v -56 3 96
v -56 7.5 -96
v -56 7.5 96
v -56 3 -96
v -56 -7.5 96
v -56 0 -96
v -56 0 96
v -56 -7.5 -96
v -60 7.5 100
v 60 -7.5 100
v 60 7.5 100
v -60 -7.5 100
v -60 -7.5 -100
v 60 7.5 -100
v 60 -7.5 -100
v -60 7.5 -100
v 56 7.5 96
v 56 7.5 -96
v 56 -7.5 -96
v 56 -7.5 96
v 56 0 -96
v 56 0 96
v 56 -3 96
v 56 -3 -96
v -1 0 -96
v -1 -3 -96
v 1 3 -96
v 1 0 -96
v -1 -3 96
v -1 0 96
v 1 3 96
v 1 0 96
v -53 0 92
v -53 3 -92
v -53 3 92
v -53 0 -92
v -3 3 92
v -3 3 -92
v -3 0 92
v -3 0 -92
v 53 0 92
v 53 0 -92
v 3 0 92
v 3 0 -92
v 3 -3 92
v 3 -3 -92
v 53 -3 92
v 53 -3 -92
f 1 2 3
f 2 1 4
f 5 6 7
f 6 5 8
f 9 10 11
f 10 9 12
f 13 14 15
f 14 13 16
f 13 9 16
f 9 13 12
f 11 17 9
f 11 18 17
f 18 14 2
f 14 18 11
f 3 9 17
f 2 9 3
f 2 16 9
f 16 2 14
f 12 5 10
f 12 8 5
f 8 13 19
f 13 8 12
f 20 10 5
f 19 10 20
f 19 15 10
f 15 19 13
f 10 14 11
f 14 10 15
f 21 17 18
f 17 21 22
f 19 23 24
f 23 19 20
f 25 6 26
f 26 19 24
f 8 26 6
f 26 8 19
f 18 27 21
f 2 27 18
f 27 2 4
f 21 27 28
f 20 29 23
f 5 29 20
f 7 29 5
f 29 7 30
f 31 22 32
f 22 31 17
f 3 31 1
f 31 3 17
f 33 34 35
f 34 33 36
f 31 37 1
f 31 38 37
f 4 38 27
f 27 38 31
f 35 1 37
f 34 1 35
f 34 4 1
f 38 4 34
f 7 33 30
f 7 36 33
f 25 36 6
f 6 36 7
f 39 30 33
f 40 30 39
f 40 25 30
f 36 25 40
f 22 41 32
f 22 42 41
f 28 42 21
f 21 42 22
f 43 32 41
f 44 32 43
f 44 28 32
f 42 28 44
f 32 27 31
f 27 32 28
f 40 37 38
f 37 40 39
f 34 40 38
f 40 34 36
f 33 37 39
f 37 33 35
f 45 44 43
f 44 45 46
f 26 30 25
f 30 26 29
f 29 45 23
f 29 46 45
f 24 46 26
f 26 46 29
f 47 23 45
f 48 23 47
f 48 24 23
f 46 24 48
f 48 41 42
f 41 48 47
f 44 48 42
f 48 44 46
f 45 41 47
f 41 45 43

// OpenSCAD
module slidingwindow(width=120, height=200, wall_thickness=15) 
{
    profile_width = 4;
    profile_depth = 3.0;
    frame_profile_width = 4;
    frame_profile_depth = wall_thickness;
    
    /* Outer frame fixed to convrete wall. */
    color([0.3,0.3,0.3, 0.2])
    genericframe(width, height, frame_profile_width, frame_profile_depth);

    /* Calculate opning size. */
    open_w = width - 2 * frame_profile_width;
    open_h = height - 2 * frame_profile_width;
    half_open_w = (open_w + frame_profile_width)/2; 
    
    /* Left window glass frame. */
    translate([-(open_w)/4, profile_depth/2, 0]) 
    color([0.5,0.5,0.5, 0.2])
    genericframe(half_open_w, open_h, profile_width, profile_depth);

    /* Right window glass frame. */
    translate([(open_w)/4, -profile_depth/2, 0]) 
    color([0.5,0.5,0.5, 0.2])
    genericframe(half_open_w, open_h, profile_width, profile_depth);
}

module genericframe(width=70, height=110, profile_width = 5, profile_depth = 8) 
{
    translate([-(width - profile_width)/2, 0, 0]) 
    cube([profile_width,profile_depth, height], center=true);
    
    translate([(width - profile_width)/2, 0, 0]) 
    cube([profile_width,profile_depth, height], center=true);

    translate([0, 0, -(height - profile_width)/2]) 
    cube([width, profile_depth, profile_width], center=true);

    translate([0, 0, (height - profile_width)/2]) 
    cube([width, profile_depth, profile_width], center=true);
}    

// For testing
slidingwindow();
